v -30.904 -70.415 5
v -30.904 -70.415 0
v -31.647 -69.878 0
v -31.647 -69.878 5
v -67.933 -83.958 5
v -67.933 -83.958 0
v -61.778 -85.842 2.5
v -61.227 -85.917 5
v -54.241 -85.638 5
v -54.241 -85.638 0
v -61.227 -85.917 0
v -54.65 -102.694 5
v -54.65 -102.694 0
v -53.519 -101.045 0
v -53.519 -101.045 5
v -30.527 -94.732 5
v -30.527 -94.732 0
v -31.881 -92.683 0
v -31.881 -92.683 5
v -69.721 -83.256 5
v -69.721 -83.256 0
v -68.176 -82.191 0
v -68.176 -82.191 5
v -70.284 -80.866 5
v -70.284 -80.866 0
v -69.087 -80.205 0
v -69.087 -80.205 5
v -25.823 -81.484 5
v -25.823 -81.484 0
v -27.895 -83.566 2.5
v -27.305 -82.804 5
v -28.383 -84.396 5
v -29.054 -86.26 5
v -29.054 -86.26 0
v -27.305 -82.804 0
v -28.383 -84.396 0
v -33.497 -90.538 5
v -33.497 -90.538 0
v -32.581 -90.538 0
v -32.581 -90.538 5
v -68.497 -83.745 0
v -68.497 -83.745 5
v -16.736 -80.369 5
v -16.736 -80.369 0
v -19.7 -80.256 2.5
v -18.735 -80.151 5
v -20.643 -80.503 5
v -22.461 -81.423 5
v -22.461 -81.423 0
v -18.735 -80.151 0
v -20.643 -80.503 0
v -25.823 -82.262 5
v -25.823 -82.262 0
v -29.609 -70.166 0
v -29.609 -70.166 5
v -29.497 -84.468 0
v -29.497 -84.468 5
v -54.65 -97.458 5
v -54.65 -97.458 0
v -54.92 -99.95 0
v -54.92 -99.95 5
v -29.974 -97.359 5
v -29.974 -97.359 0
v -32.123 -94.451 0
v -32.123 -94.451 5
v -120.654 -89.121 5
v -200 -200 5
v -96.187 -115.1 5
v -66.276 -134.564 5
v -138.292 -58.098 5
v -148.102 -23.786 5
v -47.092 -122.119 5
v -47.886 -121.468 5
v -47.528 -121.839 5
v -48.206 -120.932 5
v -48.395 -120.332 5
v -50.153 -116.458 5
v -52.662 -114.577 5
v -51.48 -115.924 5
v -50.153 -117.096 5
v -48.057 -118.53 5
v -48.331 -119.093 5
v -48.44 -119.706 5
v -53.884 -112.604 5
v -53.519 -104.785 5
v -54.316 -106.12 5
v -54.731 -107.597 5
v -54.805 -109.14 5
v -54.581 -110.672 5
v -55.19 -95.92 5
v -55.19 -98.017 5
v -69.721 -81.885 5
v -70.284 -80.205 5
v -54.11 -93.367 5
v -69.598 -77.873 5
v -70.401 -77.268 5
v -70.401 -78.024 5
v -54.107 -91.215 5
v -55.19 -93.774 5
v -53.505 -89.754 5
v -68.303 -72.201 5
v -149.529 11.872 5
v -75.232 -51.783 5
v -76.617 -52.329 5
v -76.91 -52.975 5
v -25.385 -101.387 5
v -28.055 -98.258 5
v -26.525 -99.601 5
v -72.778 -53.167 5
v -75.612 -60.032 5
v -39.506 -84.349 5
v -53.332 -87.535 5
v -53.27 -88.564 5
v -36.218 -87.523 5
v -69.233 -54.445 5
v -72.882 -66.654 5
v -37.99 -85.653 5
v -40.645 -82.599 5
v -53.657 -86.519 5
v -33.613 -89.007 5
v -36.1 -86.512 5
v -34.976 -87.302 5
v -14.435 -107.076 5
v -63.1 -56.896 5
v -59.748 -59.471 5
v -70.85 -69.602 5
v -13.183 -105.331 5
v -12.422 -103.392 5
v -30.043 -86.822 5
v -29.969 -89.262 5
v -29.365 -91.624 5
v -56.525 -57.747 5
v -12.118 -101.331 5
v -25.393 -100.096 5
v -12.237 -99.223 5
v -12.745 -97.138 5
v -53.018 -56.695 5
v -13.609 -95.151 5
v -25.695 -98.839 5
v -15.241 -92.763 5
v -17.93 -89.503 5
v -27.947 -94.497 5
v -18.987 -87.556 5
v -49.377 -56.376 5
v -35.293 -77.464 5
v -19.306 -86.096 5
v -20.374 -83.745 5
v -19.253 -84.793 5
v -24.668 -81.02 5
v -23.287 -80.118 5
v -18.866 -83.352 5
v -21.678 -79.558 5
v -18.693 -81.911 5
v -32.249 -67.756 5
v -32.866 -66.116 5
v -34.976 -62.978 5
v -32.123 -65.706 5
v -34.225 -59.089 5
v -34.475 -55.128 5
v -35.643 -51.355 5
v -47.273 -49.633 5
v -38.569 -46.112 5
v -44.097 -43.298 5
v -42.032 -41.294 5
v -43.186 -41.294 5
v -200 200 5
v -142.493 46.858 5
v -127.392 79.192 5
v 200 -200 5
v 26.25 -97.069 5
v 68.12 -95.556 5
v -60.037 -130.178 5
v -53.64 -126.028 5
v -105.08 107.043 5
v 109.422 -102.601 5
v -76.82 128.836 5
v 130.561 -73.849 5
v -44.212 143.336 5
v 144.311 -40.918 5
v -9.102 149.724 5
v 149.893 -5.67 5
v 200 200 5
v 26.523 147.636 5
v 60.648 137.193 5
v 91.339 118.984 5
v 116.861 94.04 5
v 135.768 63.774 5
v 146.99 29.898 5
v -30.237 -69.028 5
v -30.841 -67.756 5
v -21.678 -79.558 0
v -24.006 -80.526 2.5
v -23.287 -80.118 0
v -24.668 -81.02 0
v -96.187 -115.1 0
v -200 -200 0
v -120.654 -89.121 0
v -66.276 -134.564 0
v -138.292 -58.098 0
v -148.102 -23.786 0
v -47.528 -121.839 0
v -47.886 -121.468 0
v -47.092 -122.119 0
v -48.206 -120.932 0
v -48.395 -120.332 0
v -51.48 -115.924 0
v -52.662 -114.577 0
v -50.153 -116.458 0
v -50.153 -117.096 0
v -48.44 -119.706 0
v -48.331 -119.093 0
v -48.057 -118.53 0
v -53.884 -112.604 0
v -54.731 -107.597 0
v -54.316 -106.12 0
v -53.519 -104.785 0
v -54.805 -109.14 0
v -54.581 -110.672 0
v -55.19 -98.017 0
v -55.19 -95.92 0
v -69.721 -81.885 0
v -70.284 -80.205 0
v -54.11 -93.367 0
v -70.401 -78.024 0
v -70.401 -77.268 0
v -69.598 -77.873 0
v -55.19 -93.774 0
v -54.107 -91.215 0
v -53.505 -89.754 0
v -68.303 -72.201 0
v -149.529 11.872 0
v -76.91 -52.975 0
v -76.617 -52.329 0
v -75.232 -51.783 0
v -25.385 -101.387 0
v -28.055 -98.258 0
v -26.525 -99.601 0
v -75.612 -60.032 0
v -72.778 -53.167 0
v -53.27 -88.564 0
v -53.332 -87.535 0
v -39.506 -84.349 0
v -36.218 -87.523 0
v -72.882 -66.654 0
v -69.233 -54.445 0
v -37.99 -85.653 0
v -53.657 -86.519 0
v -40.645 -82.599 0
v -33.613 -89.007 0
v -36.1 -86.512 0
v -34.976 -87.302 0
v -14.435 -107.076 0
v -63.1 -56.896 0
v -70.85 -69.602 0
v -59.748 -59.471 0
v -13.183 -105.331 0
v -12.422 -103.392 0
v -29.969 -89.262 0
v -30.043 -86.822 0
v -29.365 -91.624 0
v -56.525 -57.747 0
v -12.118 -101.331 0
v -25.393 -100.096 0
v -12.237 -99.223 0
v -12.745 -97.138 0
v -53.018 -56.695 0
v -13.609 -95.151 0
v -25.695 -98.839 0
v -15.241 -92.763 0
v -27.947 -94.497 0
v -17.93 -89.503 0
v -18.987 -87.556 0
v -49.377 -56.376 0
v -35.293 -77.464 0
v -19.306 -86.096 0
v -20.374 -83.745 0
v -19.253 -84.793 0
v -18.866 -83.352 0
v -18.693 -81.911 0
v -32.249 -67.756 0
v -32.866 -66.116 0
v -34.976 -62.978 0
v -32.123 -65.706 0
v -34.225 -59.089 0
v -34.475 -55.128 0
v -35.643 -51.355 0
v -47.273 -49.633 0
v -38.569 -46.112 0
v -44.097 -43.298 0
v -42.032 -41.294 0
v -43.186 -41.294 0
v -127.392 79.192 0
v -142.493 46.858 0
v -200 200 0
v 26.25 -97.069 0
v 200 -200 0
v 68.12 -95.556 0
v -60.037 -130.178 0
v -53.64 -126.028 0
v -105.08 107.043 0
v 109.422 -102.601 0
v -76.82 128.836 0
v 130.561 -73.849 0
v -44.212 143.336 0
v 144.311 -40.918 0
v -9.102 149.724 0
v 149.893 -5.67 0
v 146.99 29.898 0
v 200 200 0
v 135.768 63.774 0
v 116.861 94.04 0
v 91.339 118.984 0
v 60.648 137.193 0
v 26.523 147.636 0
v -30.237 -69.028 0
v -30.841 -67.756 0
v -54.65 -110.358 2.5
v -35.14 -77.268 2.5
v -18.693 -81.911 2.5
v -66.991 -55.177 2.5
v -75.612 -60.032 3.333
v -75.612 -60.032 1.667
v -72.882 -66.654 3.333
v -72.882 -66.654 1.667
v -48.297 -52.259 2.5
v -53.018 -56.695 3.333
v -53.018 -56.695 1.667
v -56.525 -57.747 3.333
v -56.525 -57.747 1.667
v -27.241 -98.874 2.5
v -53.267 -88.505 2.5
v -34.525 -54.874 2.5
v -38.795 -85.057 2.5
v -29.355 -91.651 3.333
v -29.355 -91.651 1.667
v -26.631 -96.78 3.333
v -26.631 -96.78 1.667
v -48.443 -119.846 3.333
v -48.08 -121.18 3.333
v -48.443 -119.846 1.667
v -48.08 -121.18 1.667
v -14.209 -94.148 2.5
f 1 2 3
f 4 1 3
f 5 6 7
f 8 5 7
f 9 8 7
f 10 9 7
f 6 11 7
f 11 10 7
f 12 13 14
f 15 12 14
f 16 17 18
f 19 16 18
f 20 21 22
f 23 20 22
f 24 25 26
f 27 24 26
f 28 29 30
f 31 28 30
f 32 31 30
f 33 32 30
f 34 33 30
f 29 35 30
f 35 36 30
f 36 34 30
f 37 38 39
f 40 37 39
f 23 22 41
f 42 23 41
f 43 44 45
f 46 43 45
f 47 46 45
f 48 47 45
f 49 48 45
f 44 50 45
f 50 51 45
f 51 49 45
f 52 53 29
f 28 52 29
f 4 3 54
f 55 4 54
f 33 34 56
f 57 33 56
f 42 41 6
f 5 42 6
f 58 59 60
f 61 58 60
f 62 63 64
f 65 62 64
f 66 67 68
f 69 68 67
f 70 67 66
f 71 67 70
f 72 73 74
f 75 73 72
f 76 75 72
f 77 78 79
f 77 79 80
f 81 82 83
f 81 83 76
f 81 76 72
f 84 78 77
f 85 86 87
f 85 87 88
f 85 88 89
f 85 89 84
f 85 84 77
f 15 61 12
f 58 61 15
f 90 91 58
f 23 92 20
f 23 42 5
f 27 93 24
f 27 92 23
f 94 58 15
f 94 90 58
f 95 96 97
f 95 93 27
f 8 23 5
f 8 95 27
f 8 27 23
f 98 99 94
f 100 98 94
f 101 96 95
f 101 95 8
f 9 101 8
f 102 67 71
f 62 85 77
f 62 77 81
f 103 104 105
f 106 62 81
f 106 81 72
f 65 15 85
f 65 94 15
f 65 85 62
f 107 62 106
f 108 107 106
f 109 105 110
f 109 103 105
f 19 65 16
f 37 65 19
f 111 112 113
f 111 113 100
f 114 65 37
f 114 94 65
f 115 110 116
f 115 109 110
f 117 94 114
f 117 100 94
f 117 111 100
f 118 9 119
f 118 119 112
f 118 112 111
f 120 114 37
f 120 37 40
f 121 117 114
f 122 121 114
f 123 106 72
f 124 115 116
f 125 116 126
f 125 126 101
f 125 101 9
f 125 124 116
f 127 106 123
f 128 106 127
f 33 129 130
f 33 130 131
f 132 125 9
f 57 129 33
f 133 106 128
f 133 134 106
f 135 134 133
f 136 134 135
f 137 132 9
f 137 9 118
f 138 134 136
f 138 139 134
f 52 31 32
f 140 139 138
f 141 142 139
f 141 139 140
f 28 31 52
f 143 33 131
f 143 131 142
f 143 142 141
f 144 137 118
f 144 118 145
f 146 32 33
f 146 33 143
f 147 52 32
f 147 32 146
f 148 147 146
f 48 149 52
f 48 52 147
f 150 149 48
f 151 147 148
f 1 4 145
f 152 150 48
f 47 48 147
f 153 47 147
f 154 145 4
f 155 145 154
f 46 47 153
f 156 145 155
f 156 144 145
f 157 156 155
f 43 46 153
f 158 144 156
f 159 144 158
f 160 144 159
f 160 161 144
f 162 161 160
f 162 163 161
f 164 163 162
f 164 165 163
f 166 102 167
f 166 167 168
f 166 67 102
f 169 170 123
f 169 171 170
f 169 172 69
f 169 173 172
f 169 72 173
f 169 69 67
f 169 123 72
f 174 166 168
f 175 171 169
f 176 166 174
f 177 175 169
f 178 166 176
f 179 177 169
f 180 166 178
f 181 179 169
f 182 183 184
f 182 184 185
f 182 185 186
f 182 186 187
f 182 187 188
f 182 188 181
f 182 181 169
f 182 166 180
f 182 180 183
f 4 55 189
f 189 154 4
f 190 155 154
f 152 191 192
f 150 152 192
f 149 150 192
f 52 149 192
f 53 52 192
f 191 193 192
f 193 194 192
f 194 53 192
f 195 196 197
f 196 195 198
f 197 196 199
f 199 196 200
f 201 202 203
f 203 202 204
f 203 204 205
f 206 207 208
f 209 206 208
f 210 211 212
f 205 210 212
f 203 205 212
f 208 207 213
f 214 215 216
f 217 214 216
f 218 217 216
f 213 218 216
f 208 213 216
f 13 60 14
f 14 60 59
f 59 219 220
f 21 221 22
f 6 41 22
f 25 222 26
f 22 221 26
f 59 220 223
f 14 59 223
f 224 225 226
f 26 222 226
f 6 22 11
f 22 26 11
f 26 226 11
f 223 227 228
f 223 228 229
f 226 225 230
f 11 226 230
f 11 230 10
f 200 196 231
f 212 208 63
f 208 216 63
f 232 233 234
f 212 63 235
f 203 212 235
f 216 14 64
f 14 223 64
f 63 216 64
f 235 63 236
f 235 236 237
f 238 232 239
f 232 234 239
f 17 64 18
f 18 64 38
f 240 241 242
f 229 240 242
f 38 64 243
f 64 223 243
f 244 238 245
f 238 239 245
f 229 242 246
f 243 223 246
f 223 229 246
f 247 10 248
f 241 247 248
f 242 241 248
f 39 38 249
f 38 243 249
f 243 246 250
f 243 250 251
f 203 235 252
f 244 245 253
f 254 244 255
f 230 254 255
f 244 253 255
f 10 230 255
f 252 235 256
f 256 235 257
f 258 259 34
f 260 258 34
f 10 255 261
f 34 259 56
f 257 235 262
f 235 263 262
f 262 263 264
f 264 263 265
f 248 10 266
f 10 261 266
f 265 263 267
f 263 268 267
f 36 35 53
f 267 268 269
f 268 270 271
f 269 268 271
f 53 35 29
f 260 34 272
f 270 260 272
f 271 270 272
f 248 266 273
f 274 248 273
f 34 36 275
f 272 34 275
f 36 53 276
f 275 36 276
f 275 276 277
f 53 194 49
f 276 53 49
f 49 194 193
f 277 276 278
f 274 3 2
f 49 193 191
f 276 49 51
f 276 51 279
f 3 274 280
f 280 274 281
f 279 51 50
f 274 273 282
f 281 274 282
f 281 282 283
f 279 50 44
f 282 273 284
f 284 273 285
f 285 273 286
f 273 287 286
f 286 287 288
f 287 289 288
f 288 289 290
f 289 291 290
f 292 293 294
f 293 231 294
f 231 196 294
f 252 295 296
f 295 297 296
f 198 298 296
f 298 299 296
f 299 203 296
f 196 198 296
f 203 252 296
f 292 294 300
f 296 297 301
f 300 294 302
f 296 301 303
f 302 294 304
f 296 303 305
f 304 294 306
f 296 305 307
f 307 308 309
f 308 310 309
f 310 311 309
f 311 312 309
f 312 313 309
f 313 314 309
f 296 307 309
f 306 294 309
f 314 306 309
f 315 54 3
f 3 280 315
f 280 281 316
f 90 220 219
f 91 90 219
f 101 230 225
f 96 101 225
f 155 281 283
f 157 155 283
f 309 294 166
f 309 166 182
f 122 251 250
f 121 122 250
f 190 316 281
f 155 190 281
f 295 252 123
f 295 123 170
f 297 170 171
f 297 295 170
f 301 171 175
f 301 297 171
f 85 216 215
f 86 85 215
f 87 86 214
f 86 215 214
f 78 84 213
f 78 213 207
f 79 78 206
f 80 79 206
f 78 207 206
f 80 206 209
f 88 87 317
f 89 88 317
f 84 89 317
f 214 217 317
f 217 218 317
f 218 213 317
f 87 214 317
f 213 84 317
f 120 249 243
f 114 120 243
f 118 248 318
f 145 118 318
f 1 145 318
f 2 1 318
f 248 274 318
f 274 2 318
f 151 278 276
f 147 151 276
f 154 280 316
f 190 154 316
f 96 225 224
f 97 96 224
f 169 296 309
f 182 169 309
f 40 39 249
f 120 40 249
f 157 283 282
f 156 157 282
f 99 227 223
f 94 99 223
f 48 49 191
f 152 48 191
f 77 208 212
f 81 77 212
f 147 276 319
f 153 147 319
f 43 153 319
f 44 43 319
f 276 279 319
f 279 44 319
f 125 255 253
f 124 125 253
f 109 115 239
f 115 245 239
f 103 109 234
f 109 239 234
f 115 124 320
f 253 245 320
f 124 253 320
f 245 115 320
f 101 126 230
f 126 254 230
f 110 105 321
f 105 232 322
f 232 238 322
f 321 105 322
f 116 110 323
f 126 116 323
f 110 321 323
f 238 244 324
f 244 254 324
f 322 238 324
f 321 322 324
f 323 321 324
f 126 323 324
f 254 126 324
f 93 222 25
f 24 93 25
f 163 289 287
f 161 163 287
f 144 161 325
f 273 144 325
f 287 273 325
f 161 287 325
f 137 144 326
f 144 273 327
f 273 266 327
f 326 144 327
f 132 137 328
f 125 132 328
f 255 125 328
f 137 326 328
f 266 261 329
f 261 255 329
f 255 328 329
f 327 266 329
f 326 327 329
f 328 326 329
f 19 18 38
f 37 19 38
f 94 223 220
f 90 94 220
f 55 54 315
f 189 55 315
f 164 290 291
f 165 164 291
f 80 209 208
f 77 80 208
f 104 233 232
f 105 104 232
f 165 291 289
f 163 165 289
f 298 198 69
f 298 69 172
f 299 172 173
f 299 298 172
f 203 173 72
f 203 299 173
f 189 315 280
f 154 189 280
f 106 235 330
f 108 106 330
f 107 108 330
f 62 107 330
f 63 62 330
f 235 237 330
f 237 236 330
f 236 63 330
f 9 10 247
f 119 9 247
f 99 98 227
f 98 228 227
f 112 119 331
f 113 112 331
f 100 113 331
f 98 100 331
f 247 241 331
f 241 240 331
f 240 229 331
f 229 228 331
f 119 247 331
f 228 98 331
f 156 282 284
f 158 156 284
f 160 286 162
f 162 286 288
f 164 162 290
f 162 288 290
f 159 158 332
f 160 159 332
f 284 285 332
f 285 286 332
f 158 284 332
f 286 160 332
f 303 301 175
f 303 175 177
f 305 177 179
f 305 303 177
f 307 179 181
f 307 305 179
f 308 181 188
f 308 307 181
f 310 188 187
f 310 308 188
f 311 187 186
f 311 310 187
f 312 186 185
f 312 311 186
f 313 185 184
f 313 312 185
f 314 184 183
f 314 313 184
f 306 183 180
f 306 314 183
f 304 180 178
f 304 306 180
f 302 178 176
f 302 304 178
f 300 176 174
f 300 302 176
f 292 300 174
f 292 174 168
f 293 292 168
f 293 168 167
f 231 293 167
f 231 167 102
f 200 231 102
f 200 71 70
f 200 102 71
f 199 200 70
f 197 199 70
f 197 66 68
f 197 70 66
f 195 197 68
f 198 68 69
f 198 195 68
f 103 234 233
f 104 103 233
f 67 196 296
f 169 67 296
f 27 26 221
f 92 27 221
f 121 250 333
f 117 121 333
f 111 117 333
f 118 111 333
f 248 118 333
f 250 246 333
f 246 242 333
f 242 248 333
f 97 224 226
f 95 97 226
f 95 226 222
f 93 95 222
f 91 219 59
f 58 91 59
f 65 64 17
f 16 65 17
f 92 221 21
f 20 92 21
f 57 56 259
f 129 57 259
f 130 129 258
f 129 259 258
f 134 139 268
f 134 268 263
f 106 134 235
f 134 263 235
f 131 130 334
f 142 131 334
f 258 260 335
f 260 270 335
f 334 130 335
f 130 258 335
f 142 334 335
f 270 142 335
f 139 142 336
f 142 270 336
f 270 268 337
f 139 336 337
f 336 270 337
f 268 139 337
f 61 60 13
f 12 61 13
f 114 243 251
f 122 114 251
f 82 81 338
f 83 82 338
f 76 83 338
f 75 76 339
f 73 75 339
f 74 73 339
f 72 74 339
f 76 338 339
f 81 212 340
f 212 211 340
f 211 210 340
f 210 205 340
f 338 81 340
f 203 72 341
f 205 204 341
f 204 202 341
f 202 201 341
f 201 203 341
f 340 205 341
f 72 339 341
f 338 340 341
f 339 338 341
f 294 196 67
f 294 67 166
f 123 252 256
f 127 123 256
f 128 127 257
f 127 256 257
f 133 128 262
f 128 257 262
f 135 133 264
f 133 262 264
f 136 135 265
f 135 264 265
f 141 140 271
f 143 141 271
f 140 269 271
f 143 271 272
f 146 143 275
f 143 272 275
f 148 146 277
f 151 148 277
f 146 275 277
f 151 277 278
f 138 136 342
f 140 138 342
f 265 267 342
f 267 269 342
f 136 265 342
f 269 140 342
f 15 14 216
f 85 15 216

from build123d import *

# Parameters (mm, degrees)
ESQUISSE1_W        = 400
ESQUISSE1_H        = 400
ESQUISSE1_R        = 150
BOSS_EXTRU_1_DEPTH = 5
BOSS_EXTRU_2_START = -5
BOSS_EXTRU_2_DEPTH = 5
BOSS_EXTRU_4_START = -5
BOSS_EXTRU_4_DEPTH = 5


with BuildPart() as part:
    # Esquisse1 → Boss.-Extru.1 (new body)
    with BuildSketch(Plane.XY):
        Rectangle(ESQUISSE1_W, ESQUISSE1_H)
        Circle(ESQUISSE1_R, mode=Mode.SUBTRACT)
    extrude(amount=BOSS_EXTRU_1_DEPTH)

    # Esquisse2 → Boss.-Extru.2 (add)
    with BuildSketch(Plane.XY.offset(5).offset(BOSS_EXTRU_2_START)):
        with BuildLine():
            ThreePointArc((-66.275928016, -134.564116188), (17.903034415, -98.409800426), (109.421717045, -102.600622995))
            ThreePointArc((109.421717045, -102.600622995), (26.84783049, -147.57775577), (-66.275928016, -134.564116188))
        make_face()
    extrude(amount=BOSS_EXTRU_2_DEPTH)

    # Esquisse5 → Boss.-Extru.4 (add)
    with BuildSketch(Plane.XY.offset(5).offset(BOSS_EXTRU_4_START)):
        with BuildLine():
            Line((-18.866345265, -83.351919662), (-20.37407273, -83.74523987))
            add(Edge.make_bspline(
                [(-20.37407273, -83.74523987), (-18.831576298, -81.763764071), (-16.735860805, -80.369241418)],
                knots=[0, 0, 0, 1, 1, 1], degree=2))
            add(Edge.make_bspline(
                [(-16.735860805, -80.369241418), (-19.802386047, -79.615782741), (-22.460949022, -81.422874022)],
                knots=[0, 0, 0, 1, 1, 1], degree=2))
            Line((-22.460949022, -81.422874022), (-21.677782316, -79.558228062))
            add(Edge.make_bspline(
                [(-21.677782316, -79.558228062), (-24.26181325, -80.142481289), (-25.822525036, -82.262094558)],
                knots=[0, 0, 0, 1, 1, 1], degree=2))
            Line((-25.822525036, -82.262094558), (-25.822525036, -81.483648674))
            add(Edge.make_bspline(
                [(-25.822525036, -81.483648674), (-28.351333433, -83.259460466), (-29.053841556, -86.259564776)],
                knots=[0, 0, 0, 1, 1, 1], degree=2))
            Line((-29.053841556, -86.259564776), (-29.496527169, -84.468232294))
            add(Edge.make_bspline(
                [(-29.496527169, -84.468232294), (-30.385431001, -86.732906367), (-30.059960229, -91.485672478), (-26.658406188, -96.353832625), (-25.176717422, -99.770059496), (-25.385021469, -101.387375039)],
                knots=[0, 0, 0, 0, 0.406589929, 0.730891559, 1, 1, 1, 1], degree=3))
            add(Edge.make_bspline(
                [(-25.385021469, -101.387375039), (-26.802377477, -98.375380833), (-29.974054698, -97.359243335)],
                knots=[0, 0, 0, 1, 1, 1], degree=2))
            Line((-29.974054698, -97.359243335), (-32.122945451, -94.451438986))
            Line((-32.122945451, -94.451438986), (-30.527430237, -94.731681614))
            Line((-30.527430237, -94.731681614), (-31.880933057, -92.683136884))
            Line((-31.880933057, -92.683136884), (-33.497007064, -90.538320458))
            Line((-33.497007064, -90.538320458), (-32.581262202, -90.538320458))
            Line((-32.581262202, -90.538320458), (-33.613359396, -89.007007118))
            Line((-33.613359396, -89.007007118), (-36.217522242, -87.522991031))
            Line((-36.217522242, -87.522991031), (-34.976085707, -87.301815556))
            Line((-34.976085707, -87.301815556), (-36.099822643, -86.512016486))
            add(Edge.make_bspline(
                [(-36.099822643, -86.512016486), (-39.217212358, -85.557948169), (-40.645373336, -82.598959987)],
                knots=[0, 0, 0, 1, 1, 1], degree=2))
            add(Edge.make_bspline(
                [(-40.645373336, -82.598959987), (-39.03359815, -80.653112191), (-34.181178142, -77.850858673), (-32.852259513, -72.300227157), (-30.904376568, -70.414710171)],
                knots=[0, 0, 0, 0, 0.487449068, 1, 1, 1, 1], degree=3))
            Line((-30.904376568, -70.414710171), (-31.646902368, -69.877944585))
            Line((-31.646902368, -69.877944585), (-29.609451058, -70.166012753))
            Line((-29.609451058, -70.166012753), (-30.237434638, -69.028235393))
            Line((-30.237434638, -69.028235393), (-32.249484484, -67.755751936))
            Line((-32.249484484, -67.755751936), (-30.841080327, -67.755751936))
            Line((-30.841080327, -67.755751936), (-32.866048633, -66.115953665))
            Line((-32.866048633, -66.115953665), (-32.122945451, -65.705806115))
            Line((-32.122945451, -65.705806115), (-34.976085707, -62.978029277))
            add(Edge.make_bspline(
                [(-34.976085707, -62.978029277), (-34.102733297, -60.394072595), (-33.737935509, -52.117151528), (-39.05614256, -45.345642181), (-42.031693147, -41.294166441)],
                knots=[0, 0, 0, 0, 0.344230119, 1, 1, 1, 1], degree=3))
            Line((-42.031693147, -41.294166441), (-43.185854427, -41.294166441))
            Line((-43.185854427, -41.294166441), (-44.096631121, -43.298315386))
            add(Edge.make_bspline(
                [(-44.096631121, -43.298315386), (-45.231201574, -46.338252094), (-48.330686607, -50.268996334), (-48.834287807, -55.064729459), (-49.3765867, -56.376310655)],
                knots=[0, 0, 0, 0, 0.699335622, 1, 1, 1, 1], degree=3))
            add(Edge.make_bspline(
                [(-49.3765867, -56.376310655), (-53.035018211, -56.310042975), (-56.717874117, -57.429335725), (-59.748293818, -59.471450261)],
                knots=[0, 0, 0, 0, 1, 1, 1, 1], degree=3))
            add(Edge.make_bspline(
                [(-59.748293818, -59.471450261), (-61.730136737, -57.382399641), (-67.02409653, -54.780846239), (-72.769327351, -53.559543058), (-75.231721344, -51.783479704)],
                knots=[0, 0, 0, 0, 0.486790351, 1, 1, 1, 1], degree=3))
            Line((-75.231721344, -51.783479704), (-76.616603351, -52.328679392))
            Line((-76.616603351, -52.328679392), (-76.910233832, -52.974808375))
            add(Edge.make_bspline(
                [(-76.910233832, -52.974808375), (-76.187929468, -60.035339336), (-73.946183278, -67.404517716), (-68.30337696, -72.2011591)],
                knots=[0, 0, 0, 0, 1, 1, 1, 1], degree=3))
            Line((-68.30337696, -72.2011591), (-70.400668481, -77.268167724))
            Line((-70.400668481, -77.268167724), (-70.400668481, -78.023881232))
            Line((-70.400668481, -78.023881232), (-69.598297697, -77.87343671))
            Line((-69.598297697, -77.87343671), (-70.283656075, -80.205357998))
            Line((-70.283656075, -80.205357998), (-70.283656075, -80.865611092))
            Line((-70.283656075, -80.865611092), (-69.087412979, -80.205357998))
            Line((-69.087412979, -80.205357998), (-69.721157599, -81.884742883))
            Line((-69.721157599, -81.884742883), (-69.721157599, -83.255626103))
            Line((-69.721157599, -83.255626103), (-68.175660205, -82.19091787))
            Line((-68.175660205, -82.19091787), (-68.497334605, -83.74523987))
            Line((-68.497334605, -83.74523987), (-67.932636696, -83.958338287))
            add(Edge.make_bspline(
                [(-67.932636696, -83.958338287), (-65.874908009, -84.443832393), (-61.558935468, -86.72875783), (-56.654005751, -85.685370072), (-54.241439725, -85.638363098)],
                knots=[0, 0, 0, 0, 0.460172434, 1, 1, 1, 1], degree=3))
            add(Edge.make_bspline(
                [(-54.241439725, -85.638363098), (-53.550315945, -86.398092796), (-52.60563993, -89.456662165), (-54.737135432, -92.036882428), (-55.189595432, -93.773610113)],
                knots=[0, 0, 0, 0, 0.354288348, 1, 1, 1, 1], degree=3))
            Line((-55.189595432, -93.773610113), (-54.110273533, -93.367103715))
            Line((-54.110273533, -93.367103715), (-55.189595432, -95.920472028))
            Line((-55.189595432, -95.920472028), (-55.189595432, -98.016520642))
            Line((-55.189595432, -98.016520642), (-54.649934483, -97.457574345))
            Line((-54.649934483, -97.457574345), (-54.919764957, -99.950163153))
            Line((-54.919764957, -99.950163153), (-54.649934483, -102.693612698))
            Line((-54.649934483, -102.693612698), (-53.518777052, -101.045082478))
            Line((-53.518777052, -101.045082478), (-53.518777052, -104.785031634))
            add(Edge.make_bspline(
                [(-53.518777052, -104.785031634), (-54.784378844, -106.350541416), (-55.393137974, -111.388492438), (-52.283724717, -115.433656634), (-50.152818663, -117.095817906)],
                knots=[0, 0, 0, 0, 0.414653077, 1, 1, 1, 1], degree=3))
            Line((-50.152818663, -117.095817906), (-50.152818663, -116.458357954))
            Line((-50.152818663, -116.458357954), (-48.056952099, -118.529915166))
            add(Edge.make_bspline(
                [(-48.056952099, -118.529915166), (-48.859432542, -119.698539939), (-48.350236289, -121.515764764), (-47.092095427, -122.118637282)],
                knots=[0, 0, 0, 0, 1, 1, 1, 1], degree=3))
            ThreePointArc((-47.092095427, -122.118637282), (-31.094519185, -113.8787786), (-14.435031904, -107.075896838))
            add(Edge.make_bspline(
                [(-14.435031904, -107.075896838), (-11.14848124, -103.537505901), (-12.000082878, -93.183121296), (-20.698698174, -88.228707084), (-18.866345265, -83.351919662)],
                knots=[0, 0, 0, 0, 0.525387835, 1, 1, 1, 1], degree=3))
        make_face()
    extrude(amount=BOSS_EXTRU_4_DEPTH)


solid = part.part
